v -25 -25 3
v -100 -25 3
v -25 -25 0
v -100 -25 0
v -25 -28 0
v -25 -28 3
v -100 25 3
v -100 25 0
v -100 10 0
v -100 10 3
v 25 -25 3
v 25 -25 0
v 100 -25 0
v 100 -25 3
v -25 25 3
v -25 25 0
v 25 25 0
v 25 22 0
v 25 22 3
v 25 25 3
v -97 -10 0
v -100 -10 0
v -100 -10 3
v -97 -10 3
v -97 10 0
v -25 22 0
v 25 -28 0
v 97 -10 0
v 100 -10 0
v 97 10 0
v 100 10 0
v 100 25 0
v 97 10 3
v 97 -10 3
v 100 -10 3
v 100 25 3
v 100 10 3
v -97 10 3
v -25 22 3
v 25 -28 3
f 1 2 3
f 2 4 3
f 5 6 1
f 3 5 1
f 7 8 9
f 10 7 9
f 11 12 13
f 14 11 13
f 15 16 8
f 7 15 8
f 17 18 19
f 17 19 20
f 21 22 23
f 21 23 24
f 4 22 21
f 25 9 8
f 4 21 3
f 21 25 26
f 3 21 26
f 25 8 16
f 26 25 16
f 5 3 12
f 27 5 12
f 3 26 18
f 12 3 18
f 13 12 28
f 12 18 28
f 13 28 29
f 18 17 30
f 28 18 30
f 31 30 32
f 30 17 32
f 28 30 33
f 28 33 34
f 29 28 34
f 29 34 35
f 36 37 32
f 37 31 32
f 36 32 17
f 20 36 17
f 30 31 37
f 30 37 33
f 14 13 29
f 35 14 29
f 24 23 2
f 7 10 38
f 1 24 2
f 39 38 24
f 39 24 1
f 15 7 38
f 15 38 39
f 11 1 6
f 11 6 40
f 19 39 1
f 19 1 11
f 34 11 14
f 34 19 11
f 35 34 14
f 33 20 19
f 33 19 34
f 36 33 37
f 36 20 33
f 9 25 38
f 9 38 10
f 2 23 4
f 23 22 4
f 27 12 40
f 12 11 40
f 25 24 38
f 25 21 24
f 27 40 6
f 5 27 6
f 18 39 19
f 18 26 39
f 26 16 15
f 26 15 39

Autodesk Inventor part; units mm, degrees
ref_plane "YZ Plane" through (0, 0, 0) normal (1, 0, 0) x (0, 1, 0)
ref_plane "XZ Plane" through (0, 0, 0) normal (0, 1, 0) x (-1, 0, 0)
ref_plane "XY Plane" through (0, 0, 0) normal (0, 0, 1) x (1, 0, 0)
sketch "스케치1" plane through (0, 0, 0) normal (0, 0, 1) x (1, 0, 0)
  line L0 (-100, -25) -> (100, -25)
  line L1 (100, -25) -> (100, 25)
  line L2 (100, 25) -> (-100, 25)
  line L3 (-100, 25) -> (-100, -25)
  line L4 (-100, -25) -> (100, 25) construction
  line L5 (100, -25) -> (-100, 25) construction
  line L6 (-25, 22) -> (25, 22)
  line L7 (25, 22) -> (25, 28)
  line L8 (25, 28) -> (-25, 28)
  line L9 (-25, 28) -> (-25, 22)
  line L10 (-25, 22) -> (25, 28) construction
  line L11 (25, 22) -> (-25, 28) construction
  line L12 (-103, -10) -> (-97, -10)
  line L13 (-97, -10) -> (-97, 10)
  line L14 (-97, 10) -> (-103, 10)
  line L15 (-103, 10) -> (-103, -10)
  line L16 (-103, -10) -> (-97, 10) construction
  line L17 (-97, -10) -> (-103, 10) construction
  line L18 (97, -10) -> (103, -10)
  line L19 (103, -10) -> (103, 10)
  line L20 (103, 10) -> (97, 10)
  line L21 (97, 10) -> (97, -10)
  line L22 (97, -10) -> (103, 10) construction
  line L23 (103, -10) -> (97, 10) construction
  point P0 (0, 0)
  point P1 (0, 25)
  point P2 (-100, 0)
  point P3 (100, 0)
  point P4 (-100, -10)
  point P5 (100, -10)
  point P6 (100, 10)
  point P7 (25, 25)
  point P8 (-25, 25)
  point P9 (-100, 10)
  dimension "d0" = 50
  dimension "d1" = 200
  dimension "d2" = 50
  dimension "d3" = 3
  dimension "d4" = 20
  dimension "d5" = 20
  dimension "d6" = 3
  dimension "d7" = 3
extrude "돌출1" add sketch "스케치1" along normal blind 3 contours L3 L12 L13 L14 L2 L9 L6 L7 L1 L20 L21 L18 L0
sketch "스케치2" plane through (0, 0, 3) normal (0, 0, 1) x (1, 0, 0)
  line L0 (-25, -22) -> (25, -22)
  line L1 (25, -22) -> (25, -28)
  line L2 (25, -28) -> (-25, -28)
  line L3 (-25, -28) -> (-25, -22)
  line L4 (-100, -25) -> (100, -25) projected
  line L5 (-25, -22) -> (25, -28) construction
  line L6 (25, -22) -> (-25, -28) construction
  point P0 (0, 0)
  point P1 (0, -25)
  point P2 (25, -25)
  point P3 (-25, -25)
  dimension "d10" = 50
  dimension "d11" = 3
extrude "돌출2" add sketch "스케치2" against normal blind 3 contours L4 L1 L2 L3
sketch "스케치3" plane through (0, 0, 3) normal (0, 0, 1) x (1, 0, 0)
  point P0 (0, 0)
sketch "스케치4" plane through (0, 0, 3) normal (0, 0, 1) x (1, 0, 0)
  point P0 (0, 0)
properties part number "본체 겉면 레이저 옆판 수정"
